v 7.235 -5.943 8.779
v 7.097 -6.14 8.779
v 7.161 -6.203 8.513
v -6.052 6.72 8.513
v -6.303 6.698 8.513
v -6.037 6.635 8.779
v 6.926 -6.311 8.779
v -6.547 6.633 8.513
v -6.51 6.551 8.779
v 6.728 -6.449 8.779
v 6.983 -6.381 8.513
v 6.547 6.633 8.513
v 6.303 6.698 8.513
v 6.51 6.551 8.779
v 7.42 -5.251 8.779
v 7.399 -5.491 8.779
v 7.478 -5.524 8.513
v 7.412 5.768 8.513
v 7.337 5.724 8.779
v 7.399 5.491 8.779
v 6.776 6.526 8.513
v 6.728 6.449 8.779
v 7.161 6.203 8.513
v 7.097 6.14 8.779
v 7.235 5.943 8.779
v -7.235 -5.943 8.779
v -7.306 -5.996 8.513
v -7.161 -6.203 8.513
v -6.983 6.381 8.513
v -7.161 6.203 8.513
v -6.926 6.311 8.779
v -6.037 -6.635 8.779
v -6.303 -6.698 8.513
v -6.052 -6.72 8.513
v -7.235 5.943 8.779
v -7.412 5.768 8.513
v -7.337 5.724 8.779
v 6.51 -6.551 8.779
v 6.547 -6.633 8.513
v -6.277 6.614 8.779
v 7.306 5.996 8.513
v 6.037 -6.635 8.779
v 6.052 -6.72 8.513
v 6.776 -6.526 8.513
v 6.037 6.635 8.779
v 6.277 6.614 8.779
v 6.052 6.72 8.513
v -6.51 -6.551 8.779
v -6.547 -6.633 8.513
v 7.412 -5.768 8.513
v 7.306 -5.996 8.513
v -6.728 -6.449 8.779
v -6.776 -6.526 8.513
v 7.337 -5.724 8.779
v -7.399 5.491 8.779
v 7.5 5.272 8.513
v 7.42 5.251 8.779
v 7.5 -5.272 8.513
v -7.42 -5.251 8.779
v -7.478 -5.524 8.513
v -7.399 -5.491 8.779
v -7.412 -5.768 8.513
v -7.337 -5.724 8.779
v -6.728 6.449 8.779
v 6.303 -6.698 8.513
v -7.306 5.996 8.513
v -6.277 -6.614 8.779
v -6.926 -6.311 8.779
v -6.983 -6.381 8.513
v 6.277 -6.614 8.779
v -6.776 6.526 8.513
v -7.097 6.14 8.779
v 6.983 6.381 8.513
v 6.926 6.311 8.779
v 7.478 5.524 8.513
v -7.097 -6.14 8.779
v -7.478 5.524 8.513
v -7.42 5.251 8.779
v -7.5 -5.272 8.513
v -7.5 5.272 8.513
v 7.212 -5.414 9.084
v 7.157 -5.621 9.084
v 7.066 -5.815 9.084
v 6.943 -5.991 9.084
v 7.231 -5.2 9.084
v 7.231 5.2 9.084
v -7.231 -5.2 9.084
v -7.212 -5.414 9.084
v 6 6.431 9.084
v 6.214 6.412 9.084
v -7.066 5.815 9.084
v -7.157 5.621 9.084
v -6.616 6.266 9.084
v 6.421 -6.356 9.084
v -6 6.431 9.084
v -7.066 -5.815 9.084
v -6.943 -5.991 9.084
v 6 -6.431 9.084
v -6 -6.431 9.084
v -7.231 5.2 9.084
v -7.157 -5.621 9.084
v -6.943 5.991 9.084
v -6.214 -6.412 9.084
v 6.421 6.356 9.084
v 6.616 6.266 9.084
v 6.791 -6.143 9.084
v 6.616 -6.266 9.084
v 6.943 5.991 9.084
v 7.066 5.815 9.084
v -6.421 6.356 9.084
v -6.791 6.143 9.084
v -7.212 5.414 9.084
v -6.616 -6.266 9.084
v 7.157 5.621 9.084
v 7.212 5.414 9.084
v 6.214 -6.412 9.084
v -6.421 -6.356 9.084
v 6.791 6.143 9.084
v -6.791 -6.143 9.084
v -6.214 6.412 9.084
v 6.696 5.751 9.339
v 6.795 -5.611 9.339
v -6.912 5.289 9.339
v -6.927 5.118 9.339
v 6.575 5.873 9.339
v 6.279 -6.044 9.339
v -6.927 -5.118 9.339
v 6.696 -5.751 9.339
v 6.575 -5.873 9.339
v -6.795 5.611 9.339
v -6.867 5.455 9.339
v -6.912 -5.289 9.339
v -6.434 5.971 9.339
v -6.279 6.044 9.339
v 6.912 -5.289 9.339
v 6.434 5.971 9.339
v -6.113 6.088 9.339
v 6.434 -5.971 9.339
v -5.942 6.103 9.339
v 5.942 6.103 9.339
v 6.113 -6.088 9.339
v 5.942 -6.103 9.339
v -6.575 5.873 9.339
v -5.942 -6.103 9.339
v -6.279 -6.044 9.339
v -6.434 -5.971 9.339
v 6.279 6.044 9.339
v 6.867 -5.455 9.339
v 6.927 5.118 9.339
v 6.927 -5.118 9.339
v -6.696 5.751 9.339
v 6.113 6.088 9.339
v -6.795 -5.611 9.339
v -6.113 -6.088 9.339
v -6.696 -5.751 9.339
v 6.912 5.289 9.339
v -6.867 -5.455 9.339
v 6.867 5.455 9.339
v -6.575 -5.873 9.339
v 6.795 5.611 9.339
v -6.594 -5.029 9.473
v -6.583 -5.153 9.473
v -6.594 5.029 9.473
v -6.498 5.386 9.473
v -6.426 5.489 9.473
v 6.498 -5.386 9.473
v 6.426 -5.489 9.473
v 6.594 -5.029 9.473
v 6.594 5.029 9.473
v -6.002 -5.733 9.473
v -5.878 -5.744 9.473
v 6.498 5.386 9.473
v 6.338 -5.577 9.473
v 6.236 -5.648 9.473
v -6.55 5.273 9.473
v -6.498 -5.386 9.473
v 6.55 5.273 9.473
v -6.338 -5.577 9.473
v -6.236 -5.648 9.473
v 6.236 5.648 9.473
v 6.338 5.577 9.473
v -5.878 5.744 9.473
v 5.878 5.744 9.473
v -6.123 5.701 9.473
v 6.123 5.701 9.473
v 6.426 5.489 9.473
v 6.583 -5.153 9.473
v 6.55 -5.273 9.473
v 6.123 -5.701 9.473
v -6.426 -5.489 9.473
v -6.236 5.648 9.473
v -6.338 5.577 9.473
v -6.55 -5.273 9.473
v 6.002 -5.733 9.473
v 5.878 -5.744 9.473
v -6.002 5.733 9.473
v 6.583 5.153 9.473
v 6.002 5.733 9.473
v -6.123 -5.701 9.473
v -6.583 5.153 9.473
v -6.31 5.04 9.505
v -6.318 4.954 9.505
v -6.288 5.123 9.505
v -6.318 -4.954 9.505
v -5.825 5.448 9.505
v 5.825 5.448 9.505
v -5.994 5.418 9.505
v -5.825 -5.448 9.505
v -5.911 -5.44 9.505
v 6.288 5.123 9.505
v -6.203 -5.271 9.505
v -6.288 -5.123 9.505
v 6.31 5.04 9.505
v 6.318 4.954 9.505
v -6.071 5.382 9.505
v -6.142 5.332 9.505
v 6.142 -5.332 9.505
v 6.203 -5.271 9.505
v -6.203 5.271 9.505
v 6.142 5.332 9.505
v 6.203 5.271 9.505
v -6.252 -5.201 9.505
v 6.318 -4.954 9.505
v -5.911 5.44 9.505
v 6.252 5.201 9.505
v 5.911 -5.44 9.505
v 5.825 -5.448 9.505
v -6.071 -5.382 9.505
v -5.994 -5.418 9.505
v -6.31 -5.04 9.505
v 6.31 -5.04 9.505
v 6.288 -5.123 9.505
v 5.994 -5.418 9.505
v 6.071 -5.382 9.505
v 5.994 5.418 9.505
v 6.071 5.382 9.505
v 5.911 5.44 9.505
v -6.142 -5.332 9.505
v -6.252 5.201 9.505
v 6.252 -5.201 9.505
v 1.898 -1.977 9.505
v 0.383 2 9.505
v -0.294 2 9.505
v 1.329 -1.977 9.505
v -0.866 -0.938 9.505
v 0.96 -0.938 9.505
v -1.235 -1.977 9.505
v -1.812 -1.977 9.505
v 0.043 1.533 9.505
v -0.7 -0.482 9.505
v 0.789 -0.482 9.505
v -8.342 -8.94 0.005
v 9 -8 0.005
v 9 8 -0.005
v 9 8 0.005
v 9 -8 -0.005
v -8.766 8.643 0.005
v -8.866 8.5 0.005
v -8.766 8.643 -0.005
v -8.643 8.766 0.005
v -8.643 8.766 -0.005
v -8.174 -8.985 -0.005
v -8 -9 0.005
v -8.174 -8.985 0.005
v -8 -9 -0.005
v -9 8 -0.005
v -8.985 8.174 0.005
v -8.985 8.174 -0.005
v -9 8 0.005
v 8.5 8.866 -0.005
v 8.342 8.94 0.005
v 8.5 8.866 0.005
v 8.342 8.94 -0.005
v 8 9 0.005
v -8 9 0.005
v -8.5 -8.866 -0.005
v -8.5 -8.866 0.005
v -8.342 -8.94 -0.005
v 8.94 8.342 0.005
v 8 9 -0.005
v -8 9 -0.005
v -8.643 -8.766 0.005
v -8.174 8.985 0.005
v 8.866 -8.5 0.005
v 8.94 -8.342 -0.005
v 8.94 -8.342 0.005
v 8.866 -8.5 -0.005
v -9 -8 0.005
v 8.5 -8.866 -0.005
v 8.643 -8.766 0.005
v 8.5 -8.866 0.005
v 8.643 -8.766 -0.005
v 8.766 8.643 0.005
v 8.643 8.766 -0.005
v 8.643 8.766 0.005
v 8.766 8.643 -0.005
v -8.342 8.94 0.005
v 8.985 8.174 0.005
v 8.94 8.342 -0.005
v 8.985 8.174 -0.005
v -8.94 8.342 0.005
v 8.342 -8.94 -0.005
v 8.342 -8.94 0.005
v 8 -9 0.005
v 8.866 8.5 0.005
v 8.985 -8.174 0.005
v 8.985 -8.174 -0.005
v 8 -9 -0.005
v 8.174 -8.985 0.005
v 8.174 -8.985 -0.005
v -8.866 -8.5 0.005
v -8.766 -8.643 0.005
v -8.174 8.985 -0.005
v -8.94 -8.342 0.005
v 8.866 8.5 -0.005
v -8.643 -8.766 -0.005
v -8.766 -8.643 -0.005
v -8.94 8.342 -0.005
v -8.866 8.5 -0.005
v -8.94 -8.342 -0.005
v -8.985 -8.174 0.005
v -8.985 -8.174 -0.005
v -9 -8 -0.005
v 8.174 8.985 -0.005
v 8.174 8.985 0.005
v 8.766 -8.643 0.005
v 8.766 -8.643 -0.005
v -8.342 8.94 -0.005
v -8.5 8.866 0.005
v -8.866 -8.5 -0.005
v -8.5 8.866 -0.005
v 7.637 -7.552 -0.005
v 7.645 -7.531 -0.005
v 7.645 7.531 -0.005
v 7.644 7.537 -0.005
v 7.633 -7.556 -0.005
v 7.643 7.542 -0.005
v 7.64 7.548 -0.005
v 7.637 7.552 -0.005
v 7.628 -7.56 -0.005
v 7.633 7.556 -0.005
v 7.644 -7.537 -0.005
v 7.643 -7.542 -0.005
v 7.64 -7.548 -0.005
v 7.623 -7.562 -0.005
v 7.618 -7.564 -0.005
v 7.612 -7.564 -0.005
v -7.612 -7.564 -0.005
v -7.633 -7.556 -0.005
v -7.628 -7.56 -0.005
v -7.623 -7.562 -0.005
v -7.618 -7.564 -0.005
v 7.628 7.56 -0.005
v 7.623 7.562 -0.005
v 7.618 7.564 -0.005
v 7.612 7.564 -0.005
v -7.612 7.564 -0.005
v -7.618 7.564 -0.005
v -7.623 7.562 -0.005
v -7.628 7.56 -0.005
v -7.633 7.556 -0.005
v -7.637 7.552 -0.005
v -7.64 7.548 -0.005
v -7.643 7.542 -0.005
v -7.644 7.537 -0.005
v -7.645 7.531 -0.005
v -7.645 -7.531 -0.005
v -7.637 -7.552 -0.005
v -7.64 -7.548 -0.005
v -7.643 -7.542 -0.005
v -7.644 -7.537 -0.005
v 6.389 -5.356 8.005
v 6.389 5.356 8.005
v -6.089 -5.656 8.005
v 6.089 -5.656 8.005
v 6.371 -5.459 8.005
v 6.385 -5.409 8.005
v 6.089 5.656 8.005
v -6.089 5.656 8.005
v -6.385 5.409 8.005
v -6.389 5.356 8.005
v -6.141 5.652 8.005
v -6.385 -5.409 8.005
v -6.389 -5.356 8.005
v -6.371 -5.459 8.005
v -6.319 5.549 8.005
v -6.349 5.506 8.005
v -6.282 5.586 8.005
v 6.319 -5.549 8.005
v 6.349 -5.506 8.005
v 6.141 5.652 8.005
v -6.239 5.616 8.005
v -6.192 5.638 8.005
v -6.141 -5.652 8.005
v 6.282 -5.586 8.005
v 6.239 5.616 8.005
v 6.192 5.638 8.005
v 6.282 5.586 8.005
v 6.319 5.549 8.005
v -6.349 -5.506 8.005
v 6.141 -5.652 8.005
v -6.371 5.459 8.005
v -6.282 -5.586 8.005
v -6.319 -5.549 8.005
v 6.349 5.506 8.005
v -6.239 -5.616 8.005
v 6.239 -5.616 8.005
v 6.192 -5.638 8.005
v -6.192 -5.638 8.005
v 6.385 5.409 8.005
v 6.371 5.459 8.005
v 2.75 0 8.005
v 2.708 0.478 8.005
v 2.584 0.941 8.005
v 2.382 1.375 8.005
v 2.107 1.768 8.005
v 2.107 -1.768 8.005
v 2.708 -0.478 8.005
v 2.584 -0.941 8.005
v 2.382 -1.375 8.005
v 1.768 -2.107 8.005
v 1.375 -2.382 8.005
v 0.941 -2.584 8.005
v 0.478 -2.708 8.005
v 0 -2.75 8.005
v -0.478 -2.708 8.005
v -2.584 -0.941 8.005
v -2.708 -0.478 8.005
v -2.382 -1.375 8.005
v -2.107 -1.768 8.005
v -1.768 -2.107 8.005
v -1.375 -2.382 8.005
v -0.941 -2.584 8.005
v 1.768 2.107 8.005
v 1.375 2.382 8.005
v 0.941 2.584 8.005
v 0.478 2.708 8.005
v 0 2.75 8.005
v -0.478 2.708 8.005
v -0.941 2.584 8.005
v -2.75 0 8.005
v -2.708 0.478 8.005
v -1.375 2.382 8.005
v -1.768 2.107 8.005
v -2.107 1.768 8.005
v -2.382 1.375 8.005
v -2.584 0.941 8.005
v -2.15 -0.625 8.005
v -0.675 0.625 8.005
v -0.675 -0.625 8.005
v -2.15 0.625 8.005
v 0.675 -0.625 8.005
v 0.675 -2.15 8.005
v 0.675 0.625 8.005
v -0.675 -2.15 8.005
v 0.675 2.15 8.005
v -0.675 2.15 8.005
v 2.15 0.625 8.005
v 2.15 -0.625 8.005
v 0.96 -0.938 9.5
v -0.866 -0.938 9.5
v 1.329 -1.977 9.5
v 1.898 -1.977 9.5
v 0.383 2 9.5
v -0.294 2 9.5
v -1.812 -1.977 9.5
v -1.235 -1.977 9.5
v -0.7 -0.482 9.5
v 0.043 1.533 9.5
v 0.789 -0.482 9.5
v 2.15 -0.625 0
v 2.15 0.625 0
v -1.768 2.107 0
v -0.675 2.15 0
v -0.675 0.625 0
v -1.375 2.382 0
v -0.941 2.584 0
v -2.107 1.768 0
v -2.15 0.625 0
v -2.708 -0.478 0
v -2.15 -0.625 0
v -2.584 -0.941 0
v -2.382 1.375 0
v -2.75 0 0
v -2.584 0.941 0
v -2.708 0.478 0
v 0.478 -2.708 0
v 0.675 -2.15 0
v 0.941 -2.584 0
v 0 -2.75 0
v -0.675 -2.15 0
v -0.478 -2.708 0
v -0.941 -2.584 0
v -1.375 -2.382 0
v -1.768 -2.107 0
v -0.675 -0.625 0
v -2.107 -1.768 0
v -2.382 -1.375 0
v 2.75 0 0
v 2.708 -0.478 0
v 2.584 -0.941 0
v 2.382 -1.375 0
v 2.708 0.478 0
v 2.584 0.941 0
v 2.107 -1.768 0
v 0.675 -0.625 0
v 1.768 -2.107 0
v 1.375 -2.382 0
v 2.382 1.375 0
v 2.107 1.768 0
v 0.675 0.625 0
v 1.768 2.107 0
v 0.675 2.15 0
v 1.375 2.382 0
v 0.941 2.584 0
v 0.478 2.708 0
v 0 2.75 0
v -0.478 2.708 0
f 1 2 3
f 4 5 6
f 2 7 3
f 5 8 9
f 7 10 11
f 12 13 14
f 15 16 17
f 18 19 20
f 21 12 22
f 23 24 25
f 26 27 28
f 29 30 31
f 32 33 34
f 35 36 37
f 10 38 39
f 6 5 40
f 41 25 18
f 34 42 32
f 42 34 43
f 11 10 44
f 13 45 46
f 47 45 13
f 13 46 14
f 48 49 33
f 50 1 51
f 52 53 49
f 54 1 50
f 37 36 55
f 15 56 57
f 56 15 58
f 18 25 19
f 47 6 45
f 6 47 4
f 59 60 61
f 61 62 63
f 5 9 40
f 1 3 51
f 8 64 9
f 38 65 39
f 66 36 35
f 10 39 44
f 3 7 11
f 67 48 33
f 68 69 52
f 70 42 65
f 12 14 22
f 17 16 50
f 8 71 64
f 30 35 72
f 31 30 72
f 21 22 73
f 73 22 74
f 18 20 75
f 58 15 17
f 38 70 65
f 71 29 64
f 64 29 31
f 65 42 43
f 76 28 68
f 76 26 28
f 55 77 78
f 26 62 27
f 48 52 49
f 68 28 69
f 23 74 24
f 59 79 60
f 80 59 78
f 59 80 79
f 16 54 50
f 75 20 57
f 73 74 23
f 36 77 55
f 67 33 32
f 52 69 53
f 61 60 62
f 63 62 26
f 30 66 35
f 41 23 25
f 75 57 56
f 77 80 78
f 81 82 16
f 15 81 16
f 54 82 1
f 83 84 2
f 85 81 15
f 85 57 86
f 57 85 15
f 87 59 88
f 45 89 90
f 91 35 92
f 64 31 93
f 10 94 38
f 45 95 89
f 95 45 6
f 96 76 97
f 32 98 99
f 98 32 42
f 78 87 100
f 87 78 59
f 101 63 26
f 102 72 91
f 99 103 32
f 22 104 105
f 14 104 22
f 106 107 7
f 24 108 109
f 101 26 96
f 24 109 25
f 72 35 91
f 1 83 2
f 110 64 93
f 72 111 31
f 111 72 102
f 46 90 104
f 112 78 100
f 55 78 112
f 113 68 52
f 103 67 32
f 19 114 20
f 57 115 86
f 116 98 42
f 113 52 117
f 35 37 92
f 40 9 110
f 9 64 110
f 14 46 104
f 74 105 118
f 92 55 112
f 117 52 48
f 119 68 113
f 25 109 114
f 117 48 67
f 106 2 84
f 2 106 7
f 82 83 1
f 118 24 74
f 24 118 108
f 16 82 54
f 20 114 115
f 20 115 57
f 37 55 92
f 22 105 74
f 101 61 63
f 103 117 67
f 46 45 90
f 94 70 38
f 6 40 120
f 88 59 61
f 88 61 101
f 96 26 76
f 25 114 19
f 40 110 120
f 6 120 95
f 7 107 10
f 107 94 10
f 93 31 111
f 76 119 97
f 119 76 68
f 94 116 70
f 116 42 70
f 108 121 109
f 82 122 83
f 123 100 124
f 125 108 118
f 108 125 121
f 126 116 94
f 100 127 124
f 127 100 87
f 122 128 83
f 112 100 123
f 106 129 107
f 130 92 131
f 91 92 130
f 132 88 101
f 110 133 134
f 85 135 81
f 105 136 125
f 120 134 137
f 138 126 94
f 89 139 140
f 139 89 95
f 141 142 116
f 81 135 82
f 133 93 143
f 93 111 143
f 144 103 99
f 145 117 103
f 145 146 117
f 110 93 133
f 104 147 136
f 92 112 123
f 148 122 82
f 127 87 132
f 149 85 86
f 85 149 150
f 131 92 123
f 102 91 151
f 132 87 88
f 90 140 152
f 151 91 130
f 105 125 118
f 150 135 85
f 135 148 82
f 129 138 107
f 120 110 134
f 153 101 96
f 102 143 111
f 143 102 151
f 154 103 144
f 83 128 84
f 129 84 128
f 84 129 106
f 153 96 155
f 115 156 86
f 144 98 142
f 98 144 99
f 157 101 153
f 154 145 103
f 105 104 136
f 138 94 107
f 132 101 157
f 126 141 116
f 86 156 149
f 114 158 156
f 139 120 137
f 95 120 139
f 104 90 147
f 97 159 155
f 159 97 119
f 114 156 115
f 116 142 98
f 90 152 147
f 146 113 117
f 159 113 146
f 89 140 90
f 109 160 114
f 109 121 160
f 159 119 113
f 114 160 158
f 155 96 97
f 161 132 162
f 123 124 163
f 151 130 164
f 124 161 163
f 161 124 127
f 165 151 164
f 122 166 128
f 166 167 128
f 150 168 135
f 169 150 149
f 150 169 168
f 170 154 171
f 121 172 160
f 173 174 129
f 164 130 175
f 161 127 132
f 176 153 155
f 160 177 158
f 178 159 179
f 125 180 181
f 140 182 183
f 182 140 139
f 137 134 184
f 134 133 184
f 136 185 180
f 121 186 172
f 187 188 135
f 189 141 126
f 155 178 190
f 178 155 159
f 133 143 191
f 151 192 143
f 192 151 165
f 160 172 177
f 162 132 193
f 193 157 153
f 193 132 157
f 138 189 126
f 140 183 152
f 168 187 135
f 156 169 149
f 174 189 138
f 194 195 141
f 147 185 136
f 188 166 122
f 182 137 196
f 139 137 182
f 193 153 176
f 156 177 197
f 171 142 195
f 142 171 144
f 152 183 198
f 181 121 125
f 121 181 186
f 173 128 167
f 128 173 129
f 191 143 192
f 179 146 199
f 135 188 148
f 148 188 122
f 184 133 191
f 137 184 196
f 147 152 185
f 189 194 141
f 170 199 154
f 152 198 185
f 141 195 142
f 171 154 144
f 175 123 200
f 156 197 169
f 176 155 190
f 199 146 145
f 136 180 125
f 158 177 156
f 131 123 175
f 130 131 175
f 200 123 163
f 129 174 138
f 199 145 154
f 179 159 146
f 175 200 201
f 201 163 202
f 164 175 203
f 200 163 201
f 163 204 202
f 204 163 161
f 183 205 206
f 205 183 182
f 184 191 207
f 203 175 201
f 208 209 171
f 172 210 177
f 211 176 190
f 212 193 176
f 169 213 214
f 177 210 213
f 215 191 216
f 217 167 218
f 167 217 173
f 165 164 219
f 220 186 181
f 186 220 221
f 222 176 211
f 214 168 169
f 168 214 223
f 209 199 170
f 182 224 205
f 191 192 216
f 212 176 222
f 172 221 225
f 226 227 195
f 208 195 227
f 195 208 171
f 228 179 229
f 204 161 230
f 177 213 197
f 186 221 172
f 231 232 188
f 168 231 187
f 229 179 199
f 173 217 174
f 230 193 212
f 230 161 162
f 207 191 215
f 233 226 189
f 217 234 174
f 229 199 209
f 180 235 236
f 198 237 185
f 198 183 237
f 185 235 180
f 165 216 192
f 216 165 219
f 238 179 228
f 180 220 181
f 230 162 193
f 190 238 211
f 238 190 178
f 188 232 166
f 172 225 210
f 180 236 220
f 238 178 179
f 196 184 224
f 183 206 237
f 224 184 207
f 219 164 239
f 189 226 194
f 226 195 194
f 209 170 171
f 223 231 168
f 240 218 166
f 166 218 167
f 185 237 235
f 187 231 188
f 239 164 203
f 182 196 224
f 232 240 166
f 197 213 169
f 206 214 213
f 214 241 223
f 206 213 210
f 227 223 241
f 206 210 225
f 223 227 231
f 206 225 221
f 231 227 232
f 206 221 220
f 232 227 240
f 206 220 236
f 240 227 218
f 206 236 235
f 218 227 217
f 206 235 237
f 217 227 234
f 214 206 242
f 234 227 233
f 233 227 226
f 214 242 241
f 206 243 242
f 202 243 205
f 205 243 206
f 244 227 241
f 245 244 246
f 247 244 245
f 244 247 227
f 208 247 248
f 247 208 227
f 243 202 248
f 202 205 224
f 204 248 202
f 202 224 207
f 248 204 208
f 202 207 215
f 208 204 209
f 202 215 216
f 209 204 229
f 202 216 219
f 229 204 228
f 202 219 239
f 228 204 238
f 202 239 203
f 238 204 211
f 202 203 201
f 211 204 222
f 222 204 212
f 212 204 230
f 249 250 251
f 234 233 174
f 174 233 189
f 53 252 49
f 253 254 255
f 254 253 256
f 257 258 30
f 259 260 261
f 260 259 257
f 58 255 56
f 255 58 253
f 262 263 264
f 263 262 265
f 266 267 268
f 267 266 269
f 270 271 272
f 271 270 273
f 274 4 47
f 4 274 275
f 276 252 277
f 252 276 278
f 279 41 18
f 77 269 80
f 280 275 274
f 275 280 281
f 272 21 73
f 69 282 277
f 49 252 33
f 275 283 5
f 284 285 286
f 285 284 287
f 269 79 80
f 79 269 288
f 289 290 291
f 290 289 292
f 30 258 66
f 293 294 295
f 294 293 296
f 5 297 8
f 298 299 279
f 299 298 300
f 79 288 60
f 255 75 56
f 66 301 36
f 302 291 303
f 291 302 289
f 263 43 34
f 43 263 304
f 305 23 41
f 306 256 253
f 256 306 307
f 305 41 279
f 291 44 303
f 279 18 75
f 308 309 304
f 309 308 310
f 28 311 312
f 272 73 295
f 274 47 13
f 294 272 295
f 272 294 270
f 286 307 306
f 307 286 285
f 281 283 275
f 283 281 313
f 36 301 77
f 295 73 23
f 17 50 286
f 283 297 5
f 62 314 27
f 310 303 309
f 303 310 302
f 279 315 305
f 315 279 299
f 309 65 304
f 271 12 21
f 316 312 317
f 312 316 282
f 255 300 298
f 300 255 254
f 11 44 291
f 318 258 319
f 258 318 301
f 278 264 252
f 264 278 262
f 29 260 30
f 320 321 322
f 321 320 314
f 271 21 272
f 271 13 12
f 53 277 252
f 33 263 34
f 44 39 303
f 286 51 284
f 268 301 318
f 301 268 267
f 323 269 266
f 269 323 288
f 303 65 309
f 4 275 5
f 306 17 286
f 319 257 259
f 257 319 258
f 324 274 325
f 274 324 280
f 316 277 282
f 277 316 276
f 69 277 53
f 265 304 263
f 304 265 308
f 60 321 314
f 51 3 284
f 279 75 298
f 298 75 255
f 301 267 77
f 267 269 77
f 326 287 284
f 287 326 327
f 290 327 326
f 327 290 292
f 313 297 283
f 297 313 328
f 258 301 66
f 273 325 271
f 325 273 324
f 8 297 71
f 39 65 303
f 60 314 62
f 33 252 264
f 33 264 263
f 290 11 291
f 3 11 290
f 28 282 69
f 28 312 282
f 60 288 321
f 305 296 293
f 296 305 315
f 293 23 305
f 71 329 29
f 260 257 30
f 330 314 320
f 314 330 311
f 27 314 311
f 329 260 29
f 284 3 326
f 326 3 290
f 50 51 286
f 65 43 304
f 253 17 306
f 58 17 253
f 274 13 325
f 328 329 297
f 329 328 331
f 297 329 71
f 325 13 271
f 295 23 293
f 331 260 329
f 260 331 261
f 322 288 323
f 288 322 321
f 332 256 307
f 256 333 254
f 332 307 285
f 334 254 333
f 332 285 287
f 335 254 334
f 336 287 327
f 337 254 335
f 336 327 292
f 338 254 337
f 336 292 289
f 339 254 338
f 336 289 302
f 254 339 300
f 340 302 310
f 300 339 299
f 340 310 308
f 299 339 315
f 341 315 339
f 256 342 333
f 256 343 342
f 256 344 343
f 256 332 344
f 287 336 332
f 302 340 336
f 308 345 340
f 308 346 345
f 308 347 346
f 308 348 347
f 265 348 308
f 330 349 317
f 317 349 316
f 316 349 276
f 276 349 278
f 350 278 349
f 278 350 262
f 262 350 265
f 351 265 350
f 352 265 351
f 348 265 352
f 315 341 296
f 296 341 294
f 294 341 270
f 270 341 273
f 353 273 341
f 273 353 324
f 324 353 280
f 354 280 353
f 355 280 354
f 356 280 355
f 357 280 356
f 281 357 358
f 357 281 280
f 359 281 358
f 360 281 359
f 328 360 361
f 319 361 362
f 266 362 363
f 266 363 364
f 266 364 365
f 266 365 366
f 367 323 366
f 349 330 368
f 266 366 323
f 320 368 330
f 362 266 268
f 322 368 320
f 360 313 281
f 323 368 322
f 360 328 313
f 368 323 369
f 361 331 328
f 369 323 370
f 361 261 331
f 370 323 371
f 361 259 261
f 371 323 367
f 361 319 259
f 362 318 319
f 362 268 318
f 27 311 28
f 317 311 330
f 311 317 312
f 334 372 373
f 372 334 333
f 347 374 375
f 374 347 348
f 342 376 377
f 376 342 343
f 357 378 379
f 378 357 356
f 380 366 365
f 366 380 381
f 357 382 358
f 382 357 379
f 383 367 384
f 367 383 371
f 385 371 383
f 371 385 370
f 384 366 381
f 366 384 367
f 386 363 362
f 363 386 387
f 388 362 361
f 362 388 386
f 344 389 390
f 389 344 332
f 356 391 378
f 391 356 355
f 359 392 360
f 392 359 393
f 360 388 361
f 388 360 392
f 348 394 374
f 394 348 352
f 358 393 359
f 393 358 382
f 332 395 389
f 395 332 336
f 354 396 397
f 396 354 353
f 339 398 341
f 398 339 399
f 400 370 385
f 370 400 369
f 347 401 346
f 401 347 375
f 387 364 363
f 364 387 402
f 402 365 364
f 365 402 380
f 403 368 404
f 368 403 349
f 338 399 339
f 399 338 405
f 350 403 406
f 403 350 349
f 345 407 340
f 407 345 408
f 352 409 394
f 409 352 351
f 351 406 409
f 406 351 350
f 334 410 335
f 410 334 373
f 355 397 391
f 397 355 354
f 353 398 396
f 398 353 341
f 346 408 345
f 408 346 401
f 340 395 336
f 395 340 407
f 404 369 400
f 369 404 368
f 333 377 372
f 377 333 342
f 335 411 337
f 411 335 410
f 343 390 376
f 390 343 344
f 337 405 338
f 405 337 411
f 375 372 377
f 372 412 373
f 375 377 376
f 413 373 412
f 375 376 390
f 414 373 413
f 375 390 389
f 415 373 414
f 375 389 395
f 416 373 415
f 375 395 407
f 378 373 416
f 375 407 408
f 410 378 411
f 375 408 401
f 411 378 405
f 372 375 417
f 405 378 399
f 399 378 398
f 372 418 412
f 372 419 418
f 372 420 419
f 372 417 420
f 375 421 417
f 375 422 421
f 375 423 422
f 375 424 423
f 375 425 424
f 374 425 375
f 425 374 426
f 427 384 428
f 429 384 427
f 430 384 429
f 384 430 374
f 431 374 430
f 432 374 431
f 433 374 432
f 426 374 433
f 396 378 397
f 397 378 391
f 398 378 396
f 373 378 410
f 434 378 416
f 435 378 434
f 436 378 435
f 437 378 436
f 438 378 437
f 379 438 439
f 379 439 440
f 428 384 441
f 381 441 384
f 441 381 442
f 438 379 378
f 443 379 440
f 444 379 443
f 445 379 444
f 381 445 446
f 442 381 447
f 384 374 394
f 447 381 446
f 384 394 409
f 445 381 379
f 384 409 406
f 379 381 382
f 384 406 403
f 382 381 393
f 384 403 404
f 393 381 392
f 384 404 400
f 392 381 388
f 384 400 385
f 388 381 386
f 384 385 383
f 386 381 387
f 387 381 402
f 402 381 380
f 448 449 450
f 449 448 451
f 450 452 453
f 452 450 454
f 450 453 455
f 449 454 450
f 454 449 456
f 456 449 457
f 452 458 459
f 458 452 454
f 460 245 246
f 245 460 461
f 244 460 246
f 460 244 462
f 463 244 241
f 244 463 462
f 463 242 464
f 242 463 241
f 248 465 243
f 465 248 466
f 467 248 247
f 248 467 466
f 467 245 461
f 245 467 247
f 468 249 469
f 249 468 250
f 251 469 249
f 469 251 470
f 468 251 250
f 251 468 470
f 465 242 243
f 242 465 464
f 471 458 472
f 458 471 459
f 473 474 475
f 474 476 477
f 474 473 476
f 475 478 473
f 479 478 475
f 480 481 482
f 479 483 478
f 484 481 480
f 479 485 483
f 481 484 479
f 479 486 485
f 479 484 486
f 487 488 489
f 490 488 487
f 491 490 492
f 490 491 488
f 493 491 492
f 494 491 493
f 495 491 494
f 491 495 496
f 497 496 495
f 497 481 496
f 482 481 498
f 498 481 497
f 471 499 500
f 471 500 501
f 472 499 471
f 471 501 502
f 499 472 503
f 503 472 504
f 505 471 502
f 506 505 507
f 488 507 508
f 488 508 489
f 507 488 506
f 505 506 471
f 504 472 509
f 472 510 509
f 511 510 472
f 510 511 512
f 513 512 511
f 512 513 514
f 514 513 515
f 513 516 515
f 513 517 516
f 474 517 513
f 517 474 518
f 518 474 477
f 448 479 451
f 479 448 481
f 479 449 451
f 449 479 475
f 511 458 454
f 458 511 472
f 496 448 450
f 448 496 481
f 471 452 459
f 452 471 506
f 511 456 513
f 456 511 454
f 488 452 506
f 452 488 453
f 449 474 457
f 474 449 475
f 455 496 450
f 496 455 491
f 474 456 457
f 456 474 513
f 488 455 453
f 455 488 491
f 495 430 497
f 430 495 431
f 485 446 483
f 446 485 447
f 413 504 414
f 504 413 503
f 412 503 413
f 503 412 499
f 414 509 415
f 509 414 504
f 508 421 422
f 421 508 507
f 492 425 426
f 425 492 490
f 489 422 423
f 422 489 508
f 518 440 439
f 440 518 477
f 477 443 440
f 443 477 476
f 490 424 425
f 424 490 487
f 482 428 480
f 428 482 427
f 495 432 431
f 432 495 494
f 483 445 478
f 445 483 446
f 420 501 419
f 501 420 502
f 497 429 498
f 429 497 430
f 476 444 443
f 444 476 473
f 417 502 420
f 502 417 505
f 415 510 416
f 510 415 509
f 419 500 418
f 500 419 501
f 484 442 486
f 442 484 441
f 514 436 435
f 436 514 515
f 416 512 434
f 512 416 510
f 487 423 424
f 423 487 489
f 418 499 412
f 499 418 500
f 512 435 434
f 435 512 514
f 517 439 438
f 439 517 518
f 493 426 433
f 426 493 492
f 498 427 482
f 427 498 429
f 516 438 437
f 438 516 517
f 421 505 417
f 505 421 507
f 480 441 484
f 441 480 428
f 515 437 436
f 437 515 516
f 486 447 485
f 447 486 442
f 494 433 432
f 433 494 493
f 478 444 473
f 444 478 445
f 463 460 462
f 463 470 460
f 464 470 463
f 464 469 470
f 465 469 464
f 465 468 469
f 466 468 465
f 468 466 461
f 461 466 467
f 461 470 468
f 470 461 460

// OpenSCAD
export_target = "preview";
include <common/custom-shell-params.scad>

user_top_scale = 0.75;
user_keycap_edge_radius = 1.2;

include <../base/keycap.scad>
